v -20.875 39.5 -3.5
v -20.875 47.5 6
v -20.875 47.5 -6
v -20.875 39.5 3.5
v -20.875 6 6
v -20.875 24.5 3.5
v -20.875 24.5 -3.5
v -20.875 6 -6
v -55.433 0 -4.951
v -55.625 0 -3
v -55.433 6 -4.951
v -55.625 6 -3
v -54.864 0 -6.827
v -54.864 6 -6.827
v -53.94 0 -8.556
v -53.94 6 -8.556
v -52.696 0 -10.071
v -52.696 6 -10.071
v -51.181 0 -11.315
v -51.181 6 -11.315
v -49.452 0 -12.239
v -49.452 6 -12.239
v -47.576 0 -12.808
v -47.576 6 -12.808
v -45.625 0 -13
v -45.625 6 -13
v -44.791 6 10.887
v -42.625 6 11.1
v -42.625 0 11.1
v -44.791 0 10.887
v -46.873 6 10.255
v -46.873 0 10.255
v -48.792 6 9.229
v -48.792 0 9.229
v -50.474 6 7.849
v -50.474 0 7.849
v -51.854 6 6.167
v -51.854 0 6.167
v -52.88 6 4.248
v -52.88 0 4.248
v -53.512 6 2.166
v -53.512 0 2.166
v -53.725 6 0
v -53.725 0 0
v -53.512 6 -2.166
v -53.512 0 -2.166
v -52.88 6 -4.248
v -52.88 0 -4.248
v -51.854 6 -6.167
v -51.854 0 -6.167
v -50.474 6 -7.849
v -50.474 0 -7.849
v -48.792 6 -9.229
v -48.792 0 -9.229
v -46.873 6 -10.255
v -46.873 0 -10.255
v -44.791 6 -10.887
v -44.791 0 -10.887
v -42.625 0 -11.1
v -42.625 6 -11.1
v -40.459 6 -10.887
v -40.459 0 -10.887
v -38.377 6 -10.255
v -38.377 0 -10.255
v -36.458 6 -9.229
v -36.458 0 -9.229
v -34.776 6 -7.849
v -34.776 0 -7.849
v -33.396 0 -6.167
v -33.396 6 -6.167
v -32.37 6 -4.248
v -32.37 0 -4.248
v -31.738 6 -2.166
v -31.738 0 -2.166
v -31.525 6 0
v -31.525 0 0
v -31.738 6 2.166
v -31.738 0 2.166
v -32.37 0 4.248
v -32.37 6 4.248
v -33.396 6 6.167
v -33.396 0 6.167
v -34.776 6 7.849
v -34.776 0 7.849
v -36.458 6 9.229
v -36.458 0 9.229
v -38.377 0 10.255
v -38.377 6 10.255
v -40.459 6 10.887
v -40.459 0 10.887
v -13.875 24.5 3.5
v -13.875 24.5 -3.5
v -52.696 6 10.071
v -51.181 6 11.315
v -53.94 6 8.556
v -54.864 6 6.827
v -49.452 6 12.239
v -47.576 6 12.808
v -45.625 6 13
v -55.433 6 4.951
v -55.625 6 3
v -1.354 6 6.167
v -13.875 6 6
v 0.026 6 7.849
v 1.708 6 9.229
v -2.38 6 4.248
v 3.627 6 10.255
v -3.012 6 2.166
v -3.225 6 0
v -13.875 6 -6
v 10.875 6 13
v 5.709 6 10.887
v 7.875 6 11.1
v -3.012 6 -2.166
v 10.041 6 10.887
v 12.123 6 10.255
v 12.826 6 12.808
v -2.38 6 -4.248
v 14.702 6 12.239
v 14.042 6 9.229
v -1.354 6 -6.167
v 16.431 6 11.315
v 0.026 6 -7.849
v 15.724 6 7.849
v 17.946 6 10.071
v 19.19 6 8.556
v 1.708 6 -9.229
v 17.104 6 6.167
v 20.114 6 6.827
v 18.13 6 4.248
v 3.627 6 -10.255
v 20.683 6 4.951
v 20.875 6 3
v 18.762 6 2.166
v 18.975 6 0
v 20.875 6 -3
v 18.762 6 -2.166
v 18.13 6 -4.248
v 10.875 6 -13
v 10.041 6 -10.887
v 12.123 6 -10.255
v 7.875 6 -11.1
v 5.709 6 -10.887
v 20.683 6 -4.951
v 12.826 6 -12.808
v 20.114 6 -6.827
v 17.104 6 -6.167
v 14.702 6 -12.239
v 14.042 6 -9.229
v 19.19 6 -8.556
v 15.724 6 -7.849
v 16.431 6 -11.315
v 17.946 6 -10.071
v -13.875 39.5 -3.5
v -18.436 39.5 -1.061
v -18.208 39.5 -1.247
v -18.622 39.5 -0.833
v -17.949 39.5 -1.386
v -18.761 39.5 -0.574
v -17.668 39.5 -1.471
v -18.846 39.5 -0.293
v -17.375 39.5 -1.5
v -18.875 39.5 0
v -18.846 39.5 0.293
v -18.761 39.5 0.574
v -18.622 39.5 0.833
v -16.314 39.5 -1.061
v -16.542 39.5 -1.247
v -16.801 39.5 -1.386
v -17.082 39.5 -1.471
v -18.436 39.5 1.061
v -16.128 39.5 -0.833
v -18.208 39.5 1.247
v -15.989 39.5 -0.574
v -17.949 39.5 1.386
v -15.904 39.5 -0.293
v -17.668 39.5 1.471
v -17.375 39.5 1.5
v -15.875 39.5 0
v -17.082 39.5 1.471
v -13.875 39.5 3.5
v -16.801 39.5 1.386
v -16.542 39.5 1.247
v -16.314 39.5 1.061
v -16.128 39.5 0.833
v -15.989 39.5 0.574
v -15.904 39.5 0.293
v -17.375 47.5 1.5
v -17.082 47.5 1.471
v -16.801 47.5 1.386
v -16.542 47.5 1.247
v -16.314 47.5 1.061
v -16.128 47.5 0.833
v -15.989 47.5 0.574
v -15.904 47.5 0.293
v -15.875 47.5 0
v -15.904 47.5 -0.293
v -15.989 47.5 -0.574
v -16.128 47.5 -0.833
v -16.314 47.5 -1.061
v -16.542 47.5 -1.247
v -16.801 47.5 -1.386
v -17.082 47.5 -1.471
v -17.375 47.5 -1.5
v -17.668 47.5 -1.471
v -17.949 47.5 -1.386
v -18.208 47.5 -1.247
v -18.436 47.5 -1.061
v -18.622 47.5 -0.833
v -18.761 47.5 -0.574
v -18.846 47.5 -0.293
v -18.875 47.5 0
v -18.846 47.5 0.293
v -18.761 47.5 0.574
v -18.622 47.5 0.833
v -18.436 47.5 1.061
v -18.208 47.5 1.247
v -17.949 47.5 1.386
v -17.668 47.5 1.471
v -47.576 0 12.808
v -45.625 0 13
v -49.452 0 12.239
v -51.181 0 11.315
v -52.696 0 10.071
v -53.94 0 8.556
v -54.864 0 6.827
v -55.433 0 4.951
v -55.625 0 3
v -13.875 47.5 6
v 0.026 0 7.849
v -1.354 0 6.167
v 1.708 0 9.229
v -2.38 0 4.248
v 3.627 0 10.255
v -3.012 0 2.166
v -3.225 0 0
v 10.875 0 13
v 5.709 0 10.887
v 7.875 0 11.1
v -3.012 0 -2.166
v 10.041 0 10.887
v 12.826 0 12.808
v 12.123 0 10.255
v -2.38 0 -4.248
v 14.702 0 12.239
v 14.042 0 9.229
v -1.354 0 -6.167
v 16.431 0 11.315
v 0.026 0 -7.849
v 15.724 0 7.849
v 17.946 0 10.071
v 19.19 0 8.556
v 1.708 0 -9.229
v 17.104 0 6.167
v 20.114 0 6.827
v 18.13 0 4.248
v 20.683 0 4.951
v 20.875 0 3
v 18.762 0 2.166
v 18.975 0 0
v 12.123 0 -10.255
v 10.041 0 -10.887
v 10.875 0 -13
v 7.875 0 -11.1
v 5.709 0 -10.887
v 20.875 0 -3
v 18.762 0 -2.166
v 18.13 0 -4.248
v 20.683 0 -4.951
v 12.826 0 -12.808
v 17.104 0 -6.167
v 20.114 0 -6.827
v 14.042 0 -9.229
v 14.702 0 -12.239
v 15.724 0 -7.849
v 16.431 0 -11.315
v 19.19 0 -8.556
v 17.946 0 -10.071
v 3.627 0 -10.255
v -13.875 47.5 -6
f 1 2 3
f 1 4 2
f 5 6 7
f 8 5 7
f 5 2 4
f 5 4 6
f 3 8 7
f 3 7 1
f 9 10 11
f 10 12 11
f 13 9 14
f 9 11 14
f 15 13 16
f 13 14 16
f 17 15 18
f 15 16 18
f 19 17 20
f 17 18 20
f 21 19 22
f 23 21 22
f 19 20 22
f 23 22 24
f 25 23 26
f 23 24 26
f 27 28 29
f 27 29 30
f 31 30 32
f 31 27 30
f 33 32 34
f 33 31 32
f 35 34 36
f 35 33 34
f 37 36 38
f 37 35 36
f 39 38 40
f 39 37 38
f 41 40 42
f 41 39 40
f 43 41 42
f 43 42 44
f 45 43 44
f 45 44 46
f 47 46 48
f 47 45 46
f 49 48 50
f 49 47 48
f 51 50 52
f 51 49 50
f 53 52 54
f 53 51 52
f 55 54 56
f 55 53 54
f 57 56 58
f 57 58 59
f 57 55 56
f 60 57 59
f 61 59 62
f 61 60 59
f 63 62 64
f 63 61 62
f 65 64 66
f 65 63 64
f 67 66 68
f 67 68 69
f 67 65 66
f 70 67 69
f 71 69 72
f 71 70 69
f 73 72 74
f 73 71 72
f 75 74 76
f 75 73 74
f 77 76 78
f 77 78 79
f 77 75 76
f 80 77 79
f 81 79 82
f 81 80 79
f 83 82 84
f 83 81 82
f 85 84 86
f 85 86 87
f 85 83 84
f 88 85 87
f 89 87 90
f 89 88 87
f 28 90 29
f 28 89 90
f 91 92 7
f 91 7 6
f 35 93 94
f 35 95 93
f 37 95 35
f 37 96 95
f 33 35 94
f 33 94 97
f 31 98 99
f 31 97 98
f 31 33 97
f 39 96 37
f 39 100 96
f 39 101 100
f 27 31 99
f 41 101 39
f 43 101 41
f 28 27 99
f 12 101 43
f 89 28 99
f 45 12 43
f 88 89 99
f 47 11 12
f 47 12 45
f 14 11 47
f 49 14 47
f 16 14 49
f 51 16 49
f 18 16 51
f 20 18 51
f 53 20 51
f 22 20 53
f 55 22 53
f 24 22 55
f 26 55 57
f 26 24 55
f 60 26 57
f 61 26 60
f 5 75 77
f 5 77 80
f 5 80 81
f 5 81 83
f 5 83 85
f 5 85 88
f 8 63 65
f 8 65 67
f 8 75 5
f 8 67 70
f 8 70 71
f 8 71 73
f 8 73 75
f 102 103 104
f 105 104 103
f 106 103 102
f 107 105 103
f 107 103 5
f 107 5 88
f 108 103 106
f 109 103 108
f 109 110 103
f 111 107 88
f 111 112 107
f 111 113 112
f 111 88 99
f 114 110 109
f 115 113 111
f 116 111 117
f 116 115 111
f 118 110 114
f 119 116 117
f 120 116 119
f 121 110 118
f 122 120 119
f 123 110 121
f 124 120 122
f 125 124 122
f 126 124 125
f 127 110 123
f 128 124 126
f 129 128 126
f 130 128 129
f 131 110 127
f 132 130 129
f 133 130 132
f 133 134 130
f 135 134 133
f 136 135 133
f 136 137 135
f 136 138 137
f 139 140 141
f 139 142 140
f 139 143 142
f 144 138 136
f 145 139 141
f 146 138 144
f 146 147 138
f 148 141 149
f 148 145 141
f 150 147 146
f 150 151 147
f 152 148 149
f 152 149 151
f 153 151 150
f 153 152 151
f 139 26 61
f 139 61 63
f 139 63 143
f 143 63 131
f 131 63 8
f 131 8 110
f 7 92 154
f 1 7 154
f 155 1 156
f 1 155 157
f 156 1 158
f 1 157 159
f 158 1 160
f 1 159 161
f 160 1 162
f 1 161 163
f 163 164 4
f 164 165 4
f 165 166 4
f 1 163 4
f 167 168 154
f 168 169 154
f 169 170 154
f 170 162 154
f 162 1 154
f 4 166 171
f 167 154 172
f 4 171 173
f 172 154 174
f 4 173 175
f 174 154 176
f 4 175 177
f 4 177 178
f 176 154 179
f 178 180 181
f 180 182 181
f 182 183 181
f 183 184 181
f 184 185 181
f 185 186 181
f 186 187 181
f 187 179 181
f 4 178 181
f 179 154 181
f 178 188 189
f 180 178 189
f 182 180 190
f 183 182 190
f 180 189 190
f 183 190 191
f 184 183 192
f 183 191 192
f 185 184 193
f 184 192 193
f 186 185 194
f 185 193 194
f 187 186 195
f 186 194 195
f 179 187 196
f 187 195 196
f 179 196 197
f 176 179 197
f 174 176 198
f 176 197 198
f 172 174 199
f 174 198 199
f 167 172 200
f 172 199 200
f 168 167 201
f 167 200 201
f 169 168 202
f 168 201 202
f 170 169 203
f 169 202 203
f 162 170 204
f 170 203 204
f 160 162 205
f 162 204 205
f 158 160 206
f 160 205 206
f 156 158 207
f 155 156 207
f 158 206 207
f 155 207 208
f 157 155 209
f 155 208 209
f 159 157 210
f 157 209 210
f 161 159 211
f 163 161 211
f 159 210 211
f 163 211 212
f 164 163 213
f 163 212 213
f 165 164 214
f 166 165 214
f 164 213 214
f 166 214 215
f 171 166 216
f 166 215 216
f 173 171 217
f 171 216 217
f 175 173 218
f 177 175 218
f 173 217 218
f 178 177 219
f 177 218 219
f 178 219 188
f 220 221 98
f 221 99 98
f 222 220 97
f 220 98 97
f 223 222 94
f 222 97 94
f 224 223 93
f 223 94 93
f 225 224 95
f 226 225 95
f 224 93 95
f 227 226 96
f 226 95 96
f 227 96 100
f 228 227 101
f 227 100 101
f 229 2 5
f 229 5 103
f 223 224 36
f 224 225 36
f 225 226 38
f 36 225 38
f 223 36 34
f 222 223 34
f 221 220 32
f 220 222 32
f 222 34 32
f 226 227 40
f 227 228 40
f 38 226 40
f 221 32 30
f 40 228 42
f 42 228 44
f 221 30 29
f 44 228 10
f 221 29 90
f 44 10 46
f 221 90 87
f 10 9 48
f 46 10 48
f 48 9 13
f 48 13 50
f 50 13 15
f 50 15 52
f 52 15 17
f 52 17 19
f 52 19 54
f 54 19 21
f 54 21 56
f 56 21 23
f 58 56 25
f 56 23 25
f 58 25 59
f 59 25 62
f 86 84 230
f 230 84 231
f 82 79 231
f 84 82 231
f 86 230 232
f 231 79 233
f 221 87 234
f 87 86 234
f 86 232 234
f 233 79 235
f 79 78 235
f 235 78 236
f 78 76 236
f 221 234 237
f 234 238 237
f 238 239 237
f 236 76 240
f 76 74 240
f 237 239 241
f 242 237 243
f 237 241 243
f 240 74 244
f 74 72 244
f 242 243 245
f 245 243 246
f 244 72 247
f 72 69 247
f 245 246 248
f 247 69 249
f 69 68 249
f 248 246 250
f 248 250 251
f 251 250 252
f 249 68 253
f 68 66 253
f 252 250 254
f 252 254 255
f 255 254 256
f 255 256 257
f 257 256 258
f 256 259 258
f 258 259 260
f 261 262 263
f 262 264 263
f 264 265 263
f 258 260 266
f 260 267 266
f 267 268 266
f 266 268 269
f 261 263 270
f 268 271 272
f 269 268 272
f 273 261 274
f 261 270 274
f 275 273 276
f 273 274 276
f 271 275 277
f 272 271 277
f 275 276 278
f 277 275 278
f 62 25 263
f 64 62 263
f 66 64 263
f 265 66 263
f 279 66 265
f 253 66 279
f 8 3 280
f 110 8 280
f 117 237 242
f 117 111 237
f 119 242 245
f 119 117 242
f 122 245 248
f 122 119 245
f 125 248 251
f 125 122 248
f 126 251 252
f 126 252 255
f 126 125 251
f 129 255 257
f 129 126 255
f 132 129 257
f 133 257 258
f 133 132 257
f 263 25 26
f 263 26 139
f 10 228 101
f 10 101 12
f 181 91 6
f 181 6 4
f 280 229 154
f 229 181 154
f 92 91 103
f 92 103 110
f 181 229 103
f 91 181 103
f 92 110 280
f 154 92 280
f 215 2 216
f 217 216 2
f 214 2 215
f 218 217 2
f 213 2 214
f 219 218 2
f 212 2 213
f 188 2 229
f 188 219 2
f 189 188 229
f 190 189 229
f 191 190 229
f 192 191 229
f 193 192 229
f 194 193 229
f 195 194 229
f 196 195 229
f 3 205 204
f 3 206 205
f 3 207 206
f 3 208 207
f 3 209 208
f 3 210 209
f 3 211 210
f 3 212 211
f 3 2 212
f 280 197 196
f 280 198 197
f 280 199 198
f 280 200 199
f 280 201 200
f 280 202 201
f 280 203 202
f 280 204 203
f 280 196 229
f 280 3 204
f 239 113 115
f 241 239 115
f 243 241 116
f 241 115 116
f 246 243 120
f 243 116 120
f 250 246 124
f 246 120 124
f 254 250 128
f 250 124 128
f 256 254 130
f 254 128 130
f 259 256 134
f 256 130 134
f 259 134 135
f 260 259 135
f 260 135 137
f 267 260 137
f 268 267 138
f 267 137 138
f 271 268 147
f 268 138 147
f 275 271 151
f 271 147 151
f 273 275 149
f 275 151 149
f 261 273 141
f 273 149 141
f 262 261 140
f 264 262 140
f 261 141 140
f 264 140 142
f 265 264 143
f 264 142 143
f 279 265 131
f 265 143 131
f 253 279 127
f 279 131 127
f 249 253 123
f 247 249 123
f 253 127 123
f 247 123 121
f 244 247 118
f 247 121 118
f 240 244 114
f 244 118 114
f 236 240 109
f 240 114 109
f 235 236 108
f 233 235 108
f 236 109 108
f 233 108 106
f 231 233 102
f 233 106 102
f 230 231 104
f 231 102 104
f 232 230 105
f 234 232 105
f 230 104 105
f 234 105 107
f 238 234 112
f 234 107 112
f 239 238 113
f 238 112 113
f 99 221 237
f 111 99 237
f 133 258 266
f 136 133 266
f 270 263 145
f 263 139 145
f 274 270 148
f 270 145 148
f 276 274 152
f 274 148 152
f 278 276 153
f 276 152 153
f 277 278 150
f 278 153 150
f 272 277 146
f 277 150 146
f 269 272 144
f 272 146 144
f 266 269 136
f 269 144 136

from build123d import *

# Parameters (mm, degrees)
SKETCH_1_W             = 41.75
SKETCH_1_H             = 26
EXTRUDE_1_DEPTH        = 6
SKETCH_2_R             = 11.1
CUT_EXTRUDE_1_DEPTH    = 6
SKETCH_3_W             = 7
SKETCH_3_H             = 12
EXTRUDE_2_DEPTH        = 41.5
SKETCH_4_W             = 7
SKETCH_4_H             = 15
CUT_EXTRUDE_2_DEPTH    = 7
FILLET_1_R             = 10
FILLET_1_OF_MIRROR_1_R = 10
SKETCH_5_R             = 1.5
CUT_EXTRUDE_4_DEPTH    = 8


with BuildPart() as part:
    # Эскиз1 → Бобышка-Вытянуть1 (new body)
    with BuildSketch(Plane(origin=(0, 0, 0), x_dir=(1, 0, 0), z_dir=(0, 1, 0))):
        Rectangle(SKETCH_1_W, SKETCH_1_H)
    extrude_1 = extrude(amount=EXTRUDE_1_DEPTH)

    # Эскиз2 → Вырез-Вытянуть1 (cut)
    with BuildSketch(Plane(origin=(0, 6, 0), x_dir=(1, 0, 0), z_dir=(0, 1, 0))):
        with Locations(Location((7.875, 0, 0), (0, 0, 270))):
            Circle(SKETCH_2_R)
    cut_extrude_1 = extrude(amount=-CUT_EXTRUDE_1_DEPTH, mode=Mode.SUBTRACT)

    # Эскиз3 → Бобышка-Вытянуть2 (add)
    with BuildSketch(Plane(origin=(0, 6, 0), x_dir=(1, 0, 0), z_dir=(0, 1, 0))):
        with Locations((-17.375, 0)):
            Rectangle(SKETCH_3_W, SKETCH_3_H)
    extrude_2 = extrude(amount=EXTRUDE_2_DEPTH)

    # Эскиз4 → Вырез-Вытянуть2 (cut)
    with BuildSketch(Plane.ZY.offset(20.875)):
        with Locations((0, 32)):
            Rectangle(SKETCH_4_W, SKETCH_4_H)
    cut_extrude_2 = extrude(amount=-CUT_EXTRUDE_2_DEPTH, mode=Mode.SUBTRACT)

    # Скругление1
    fillet_1_edges = [part.edges().sort_by_distance(p)[0] for p in [
        (20.875, 3, 13),
        (20.875, 3, -13),
    ]]
    fillet(fillet_1_edges, radius=FILLET_1_R)

    # Зеркальное отражение1: Бобышка-Вытянуть1, Вырез-Вытянуть1, Бобышка-Вытянуть2, Вырез-Вытянуть2 across plane
    add(extrude_1.mirror(Plane.ZY.offset(17.375)))
    add(cut_extrude_1.mirror(Plane.ZY.offset(17.375)), mode=Mode.SUBTRACT)
    add(extrude_2.mirror(Plane.ZY.offset(17.375)))
    add(cut_extrude_2.mirror(Plane.ZY.offset(17.375)), mode=Mode.SUBTRACT)

    # Скругление1 of Зеркальное отражение1
    fillet_1_of_mirror_1_edges = [part.edges().sort_by_distance(p)[0] for p in [
        (-55.625, 3, 13),
        (-55.625, 3, -13),
    ]]
    fillet(fillet_1_of_mirror_1_edges, radius=FILLET_1_OF_MIRROR_1_R)

    # Эскиз5 → Вырез-Вытянуть4 (cut)
    with BuildSketch(Plane(origin=(0, 47.5, 0), x_dir=(1, 0, 0), z_dir=(0, 1, 0))):
        with Locations(Location((-17.375, 0, 0), (0, 0, 270))):
            Circle(SKETCH_5_R)
    extrude(amount=-CUT_EXTRUDE_4_DEPTH, mode=Mode.SUBTRACT)


solid = part.part
